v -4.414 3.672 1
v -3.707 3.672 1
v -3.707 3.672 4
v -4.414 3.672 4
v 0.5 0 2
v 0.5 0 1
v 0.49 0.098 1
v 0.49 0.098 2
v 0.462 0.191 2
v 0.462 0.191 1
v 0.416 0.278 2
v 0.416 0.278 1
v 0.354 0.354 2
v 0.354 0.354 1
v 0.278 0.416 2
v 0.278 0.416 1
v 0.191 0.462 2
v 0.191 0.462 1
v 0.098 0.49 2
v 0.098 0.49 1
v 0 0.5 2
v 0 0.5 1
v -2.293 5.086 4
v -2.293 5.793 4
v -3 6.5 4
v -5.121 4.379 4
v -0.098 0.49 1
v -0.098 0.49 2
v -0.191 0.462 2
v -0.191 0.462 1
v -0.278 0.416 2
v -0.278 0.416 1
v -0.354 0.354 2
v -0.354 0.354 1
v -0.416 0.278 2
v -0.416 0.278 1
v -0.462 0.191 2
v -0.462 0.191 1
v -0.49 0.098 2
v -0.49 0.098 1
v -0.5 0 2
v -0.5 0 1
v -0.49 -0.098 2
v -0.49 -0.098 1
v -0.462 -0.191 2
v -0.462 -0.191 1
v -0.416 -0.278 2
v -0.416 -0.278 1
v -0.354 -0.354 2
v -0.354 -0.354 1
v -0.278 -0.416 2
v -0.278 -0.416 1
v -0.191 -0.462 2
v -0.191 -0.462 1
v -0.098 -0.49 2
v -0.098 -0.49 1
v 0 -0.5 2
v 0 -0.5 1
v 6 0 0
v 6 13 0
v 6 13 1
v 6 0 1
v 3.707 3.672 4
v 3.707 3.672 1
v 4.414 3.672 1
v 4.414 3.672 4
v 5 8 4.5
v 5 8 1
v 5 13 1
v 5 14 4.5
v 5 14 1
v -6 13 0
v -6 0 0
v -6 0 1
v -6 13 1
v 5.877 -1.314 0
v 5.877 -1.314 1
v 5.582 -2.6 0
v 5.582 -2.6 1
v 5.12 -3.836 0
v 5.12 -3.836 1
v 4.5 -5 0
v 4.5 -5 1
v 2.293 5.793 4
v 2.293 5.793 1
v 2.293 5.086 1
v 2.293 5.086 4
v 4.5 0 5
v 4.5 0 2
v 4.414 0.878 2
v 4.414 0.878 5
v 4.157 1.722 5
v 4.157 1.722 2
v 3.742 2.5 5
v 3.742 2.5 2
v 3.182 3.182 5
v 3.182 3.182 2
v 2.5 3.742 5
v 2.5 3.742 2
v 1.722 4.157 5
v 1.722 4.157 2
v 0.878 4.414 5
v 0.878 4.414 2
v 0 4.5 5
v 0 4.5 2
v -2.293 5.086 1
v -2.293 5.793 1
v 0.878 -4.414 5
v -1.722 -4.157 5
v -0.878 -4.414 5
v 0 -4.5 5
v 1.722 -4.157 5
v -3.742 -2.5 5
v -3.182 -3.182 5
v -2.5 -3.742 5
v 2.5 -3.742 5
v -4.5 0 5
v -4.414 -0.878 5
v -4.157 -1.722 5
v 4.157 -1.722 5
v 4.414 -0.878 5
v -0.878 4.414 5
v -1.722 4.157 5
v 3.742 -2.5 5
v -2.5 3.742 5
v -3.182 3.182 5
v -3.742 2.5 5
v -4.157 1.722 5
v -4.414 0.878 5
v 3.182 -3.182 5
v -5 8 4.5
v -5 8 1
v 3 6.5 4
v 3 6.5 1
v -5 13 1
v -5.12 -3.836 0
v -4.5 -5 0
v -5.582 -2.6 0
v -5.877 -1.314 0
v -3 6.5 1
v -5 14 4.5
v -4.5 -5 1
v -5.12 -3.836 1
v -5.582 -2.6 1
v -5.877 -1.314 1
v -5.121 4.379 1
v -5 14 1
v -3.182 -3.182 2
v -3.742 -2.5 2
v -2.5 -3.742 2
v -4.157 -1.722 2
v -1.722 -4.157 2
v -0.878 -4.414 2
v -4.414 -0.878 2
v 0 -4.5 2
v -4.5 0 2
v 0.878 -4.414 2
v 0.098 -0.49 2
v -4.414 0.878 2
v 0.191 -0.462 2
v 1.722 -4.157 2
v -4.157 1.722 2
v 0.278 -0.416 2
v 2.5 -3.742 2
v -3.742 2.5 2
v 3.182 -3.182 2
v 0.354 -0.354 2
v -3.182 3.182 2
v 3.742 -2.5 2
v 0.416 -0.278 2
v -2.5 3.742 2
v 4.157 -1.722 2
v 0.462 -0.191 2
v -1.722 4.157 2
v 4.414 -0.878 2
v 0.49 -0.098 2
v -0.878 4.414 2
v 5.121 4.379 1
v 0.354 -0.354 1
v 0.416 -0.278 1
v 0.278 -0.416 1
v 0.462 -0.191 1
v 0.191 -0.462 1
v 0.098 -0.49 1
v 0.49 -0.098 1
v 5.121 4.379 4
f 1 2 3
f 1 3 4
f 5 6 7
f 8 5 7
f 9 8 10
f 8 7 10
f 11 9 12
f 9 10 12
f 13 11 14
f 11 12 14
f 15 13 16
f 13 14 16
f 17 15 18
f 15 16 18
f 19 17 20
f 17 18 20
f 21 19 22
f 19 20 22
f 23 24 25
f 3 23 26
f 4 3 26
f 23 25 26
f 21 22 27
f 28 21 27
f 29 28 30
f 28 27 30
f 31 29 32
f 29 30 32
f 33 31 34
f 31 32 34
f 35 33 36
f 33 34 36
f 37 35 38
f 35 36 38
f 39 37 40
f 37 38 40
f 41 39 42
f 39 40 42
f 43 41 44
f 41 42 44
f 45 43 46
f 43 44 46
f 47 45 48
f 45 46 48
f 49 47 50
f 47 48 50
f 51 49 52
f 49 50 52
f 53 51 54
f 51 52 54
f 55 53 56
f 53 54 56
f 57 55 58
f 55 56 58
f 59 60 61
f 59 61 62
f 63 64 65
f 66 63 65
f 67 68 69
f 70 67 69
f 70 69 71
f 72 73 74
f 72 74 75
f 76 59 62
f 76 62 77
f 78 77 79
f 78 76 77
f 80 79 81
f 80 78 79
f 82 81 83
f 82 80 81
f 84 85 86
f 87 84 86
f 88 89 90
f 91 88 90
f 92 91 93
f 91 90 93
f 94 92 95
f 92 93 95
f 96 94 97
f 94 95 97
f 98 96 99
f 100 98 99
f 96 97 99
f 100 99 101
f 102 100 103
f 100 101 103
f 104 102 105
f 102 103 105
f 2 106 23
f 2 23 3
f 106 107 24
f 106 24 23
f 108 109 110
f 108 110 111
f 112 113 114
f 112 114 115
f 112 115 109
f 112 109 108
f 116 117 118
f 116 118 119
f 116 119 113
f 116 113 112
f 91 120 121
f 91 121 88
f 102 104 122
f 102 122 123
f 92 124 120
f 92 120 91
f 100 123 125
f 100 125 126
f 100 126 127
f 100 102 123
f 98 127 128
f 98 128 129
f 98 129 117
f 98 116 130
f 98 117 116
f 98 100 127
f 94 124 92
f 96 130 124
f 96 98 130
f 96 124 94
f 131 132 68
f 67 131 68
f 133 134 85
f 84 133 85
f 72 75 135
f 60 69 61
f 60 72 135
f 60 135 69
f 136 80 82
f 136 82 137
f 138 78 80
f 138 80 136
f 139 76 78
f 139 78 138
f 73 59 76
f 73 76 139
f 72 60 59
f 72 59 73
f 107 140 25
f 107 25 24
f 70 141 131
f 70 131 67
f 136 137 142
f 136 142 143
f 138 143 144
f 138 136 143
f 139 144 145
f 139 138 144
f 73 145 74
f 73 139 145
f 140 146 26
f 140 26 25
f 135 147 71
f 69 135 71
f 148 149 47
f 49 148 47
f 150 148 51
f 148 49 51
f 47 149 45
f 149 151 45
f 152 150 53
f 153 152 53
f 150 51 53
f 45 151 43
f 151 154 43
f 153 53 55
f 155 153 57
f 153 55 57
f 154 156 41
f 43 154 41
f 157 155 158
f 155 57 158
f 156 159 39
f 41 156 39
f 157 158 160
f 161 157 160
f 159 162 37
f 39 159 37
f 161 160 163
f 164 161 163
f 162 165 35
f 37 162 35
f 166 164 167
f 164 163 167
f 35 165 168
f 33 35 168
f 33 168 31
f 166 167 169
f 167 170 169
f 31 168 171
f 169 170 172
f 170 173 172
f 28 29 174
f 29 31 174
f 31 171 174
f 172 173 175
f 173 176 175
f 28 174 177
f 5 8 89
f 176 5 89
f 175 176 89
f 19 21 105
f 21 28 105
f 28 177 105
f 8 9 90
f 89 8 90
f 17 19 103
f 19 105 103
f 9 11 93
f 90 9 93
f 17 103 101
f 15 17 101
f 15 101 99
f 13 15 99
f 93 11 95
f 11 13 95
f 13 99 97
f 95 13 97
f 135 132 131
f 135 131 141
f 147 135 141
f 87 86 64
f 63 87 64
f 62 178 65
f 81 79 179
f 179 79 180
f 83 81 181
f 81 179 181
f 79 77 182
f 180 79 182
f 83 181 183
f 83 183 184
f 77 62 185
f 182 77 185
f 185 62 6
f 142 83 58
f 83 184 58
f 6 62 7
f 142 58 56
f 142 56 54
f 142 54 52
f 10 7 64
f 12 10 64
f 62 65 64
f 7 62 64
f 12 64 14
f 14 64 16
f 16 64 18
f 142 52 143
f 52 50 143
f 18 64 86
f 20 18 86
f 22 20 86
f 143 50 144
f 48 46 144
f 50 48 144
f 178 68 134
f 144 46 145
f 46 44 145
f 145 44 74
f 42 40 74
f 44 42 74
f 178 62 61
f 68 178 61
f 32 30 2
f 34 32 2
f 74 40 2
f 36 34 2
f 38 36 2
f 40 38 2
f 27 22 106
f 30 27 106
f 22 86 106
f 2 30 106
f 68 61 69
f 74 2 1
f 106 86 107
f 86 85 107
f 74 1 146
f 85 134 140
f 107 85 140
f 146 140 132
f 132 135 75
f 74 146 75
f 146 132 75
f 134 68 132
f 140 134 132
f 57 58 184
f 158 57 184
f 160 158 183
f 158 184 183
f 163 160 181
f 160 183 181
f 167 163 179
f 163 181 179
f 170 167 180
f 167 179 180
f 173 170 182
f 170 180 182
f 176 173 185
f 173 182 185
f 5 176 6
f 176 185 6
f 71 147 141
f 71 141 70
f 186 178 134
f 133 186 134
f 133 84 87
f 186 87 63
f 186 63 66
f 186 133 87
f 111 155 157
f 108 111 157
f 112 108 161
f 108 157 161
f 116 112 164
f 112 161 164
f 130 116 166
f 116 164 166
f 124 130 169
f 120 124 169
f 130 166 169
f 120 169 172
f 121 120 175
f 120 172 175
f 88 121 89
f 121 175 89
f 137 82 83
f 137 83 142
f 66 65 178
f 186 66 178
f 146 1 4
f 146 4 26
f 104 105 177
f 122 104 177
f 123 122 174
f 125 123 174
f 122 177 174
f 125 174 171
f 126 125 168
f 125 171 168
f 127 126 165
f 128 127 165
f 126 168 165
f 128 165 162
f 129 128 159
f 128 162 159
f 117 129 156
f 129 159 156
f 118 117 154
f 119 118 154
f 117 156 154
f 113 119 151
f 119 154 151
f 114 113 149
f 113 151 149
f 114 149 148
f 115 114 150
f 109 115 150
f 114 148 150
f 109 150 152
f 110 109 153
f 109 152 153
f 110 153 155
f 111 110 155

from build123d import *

# Parameters (mm, degrees)
BOSS_EXTRU_1_DEPTH = 1
BOSS_EXTRU_2_START = 1
BOSS_EXTRU_2_DEPTH = 1
BOSS_EXTRU_3_START = 2
BOSS_EXTRU_3_DEPTH = 3
BOSS_EXTRU_4_START = 1
ESQUISSE1_6_W      = 10
ESQUISSE1_6_H      = 6
BOSS_EXTRU_4_DEPTH = 3.5
BOSS_EXTRU_5_DEPTH = 3


with BuildPart() as part:
    # Esquisse1 → Boss.-Extru.1 (new body)
    with BuildSketch(Plane.XY):
        with BuildLine():
            Line((-6, 0), (-6, 13))
            Line((-6, 13), (6, 13))
            Line((6, 13), (6, 0))
            ThreePointArc((6, 0), (5.582013923, -2.599604177), (4.5, -5))
            Line((4.5, -5), (-4.5, -5))
            ThreePointArc((-4.5, -5), (-5.582013923, -2.599604177), (-6, 0))
        make_face()
    extrude(amount=BOSS_EXTRU_1_DEPTH)

    # Esquisse1<4> → Boss.-Extru.2 (add)
    with BuildSketch(Plane.XY.offset(BOSS_EXTRU_2_START)):
        with BuildLine():
            ThreePointArc((0, 0.5), (-0.5, 0), (0, -0.5))
            Line((0, -0.5), (0, 0.5))
        make_face()
        with BuildLine():
            Line((0, 0.5), (0, -0.5))
            ThreePointArc((0, -0.5), (0.353553391, -0.353553391), (0.5, 0))
            ThreePointArc((0.5, 0), (0.353553391, 0.353553391), (0, 0.5))
        make_face()
    extrude(amount=BOSS_EXTRU_2_DEPTH)

    # Esquisse1<5> → Boss.-Extru.3 (add)
    with BuildSketch(Plane.XY.offset(BOSS_EXTRU_3_START)):
        with BuildLine():
            ThreePointArc((0, 4.5), (-4.5, 0), (0, -4.5))
            Line((0, -4.5), (0, -0.5))
            ThreePointArc((0, -0.5), (-0.5, 0), (0, 0.5))
            Line((0, 0.5), (0, 4.5))
        make_face()
        with BuildLine():
            Line((0, -0.5), (0, -4.5))
            ThreePointArc((0, -4.5), (3.181980515, -3.181980515), (4.5, 0))
            ThreePointArc((4.5, 0), (3.181980515, 3.181980515), (0, 4.5))
            Line((0, 4.5), (0, 0.5))
            ThreePointArc((0, 0.5), (0.353553391, 0.353553391), (0.5, 0))
            ThreePointArc((0.5, 0), (0.353553391, -0.353553391), (0, -0.5))
        make_face()
        with BuildLine():
            ThreePointArc((0, 0.5), (-0.5, 0), (0, -0.5))
            Line((0, -0.5), (0, 0.5))
        make_face()
        with BuildLine():
            Line((0, 0.5), (0, -0.5))
            ThreePointArc((0, -0.5), (0.353553391, -0.353553391), (0.5, 0))
            ThreePointArc((0.5, 0), (0.353553391, 0.353553391), (0, 0.5))
        make_face()
    extrude(amount=BOSS_EXTRU_3_DEPTH)

    # Esquisse1<6> → Boss.-Extru.4 (add)
    with BuildSketch(Plane.XY.offset(BOSS_EXTRU_4_START)):
        with Locations((0, 11)):
            Rectangle(ESQUISSE1_6_W, ESQUISSE1_6_H)
    extrude(amount=BOSS_EXTRU_4_DEPTH)

    # Esquisse2 → Boss.-Extru.5 (add)
    with BuildSketch(Plane.XY.offset(1)):
        Polygon((-5.121320344, 4.378679656), (-3, 6.5), (-2.292893219, 5.792893219), (-2.292893219, 5.085786438), (-3.707106781, 3.671572875), (-4.414213562, 3.671572875), align=None)
    boss_extru_5 = extrude(amount=BOSS_EXTRU_5_DEPTH)

    # Symétrie1: Boss.-Extru.5 across plane
    add(boss_extru_5.mirror(Plane(origin=(0, 0, 0), x_dir=(0, 0, 1), z_dir=(1, 0, 0))))


solid = part.part
